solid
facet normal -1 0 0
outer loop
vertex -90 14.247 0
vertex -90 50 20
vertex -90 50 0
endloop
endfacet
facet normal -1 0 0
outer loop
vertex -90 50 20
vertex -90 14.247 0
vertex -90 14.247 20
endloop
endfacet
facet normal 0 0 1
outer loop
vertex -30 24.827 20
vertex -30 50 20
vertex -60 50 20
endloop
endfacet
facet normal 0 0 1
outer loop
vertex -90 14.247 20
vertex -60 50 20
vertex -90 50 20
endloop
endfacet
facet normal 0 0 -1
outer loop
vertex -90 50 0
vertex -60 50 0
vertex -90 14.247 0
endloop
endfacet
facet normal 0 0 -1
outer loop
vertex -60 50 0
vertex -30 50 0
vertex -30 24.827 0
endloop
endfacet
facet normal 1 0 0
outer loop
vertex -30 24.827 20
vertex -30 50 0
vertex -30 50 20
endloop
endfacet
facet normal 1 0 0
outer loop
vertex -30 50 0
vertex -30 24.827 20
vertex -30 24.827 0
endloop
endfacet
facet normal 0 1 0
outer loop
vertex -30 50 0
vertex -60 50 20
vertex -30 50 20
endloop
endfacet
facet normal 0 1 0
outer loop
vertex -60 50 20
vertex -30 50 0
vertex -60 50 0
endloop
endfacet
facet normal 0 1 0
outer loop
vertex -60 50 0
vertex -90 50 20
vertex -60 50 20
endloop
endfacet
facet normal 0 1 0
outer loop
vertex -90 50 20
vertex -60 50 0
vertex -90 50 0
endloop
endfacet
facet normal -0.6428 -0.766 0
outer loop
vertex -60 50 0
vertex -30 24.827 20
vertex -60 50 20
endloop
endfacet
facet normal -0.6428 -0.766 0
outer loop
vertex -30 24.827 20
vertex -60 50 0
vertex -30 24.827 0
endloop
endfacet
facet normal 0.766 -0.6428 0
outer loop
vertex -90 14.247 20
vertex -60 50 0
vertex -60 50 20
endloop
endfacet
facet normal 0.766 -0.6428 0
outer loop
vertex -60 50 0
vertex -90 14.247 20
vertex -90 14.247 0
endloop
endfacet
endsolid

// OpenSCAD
translate([-30,50,0])
scale([3,3,1])
rotate([0,0,+180]) {
    difference() {
        cube([20, 20, 20]);
        translate([10, 0, -1]) {
            rotate([0,0,50]) {
                cube([30, 30, 30]);
            }
        }
    }
}
